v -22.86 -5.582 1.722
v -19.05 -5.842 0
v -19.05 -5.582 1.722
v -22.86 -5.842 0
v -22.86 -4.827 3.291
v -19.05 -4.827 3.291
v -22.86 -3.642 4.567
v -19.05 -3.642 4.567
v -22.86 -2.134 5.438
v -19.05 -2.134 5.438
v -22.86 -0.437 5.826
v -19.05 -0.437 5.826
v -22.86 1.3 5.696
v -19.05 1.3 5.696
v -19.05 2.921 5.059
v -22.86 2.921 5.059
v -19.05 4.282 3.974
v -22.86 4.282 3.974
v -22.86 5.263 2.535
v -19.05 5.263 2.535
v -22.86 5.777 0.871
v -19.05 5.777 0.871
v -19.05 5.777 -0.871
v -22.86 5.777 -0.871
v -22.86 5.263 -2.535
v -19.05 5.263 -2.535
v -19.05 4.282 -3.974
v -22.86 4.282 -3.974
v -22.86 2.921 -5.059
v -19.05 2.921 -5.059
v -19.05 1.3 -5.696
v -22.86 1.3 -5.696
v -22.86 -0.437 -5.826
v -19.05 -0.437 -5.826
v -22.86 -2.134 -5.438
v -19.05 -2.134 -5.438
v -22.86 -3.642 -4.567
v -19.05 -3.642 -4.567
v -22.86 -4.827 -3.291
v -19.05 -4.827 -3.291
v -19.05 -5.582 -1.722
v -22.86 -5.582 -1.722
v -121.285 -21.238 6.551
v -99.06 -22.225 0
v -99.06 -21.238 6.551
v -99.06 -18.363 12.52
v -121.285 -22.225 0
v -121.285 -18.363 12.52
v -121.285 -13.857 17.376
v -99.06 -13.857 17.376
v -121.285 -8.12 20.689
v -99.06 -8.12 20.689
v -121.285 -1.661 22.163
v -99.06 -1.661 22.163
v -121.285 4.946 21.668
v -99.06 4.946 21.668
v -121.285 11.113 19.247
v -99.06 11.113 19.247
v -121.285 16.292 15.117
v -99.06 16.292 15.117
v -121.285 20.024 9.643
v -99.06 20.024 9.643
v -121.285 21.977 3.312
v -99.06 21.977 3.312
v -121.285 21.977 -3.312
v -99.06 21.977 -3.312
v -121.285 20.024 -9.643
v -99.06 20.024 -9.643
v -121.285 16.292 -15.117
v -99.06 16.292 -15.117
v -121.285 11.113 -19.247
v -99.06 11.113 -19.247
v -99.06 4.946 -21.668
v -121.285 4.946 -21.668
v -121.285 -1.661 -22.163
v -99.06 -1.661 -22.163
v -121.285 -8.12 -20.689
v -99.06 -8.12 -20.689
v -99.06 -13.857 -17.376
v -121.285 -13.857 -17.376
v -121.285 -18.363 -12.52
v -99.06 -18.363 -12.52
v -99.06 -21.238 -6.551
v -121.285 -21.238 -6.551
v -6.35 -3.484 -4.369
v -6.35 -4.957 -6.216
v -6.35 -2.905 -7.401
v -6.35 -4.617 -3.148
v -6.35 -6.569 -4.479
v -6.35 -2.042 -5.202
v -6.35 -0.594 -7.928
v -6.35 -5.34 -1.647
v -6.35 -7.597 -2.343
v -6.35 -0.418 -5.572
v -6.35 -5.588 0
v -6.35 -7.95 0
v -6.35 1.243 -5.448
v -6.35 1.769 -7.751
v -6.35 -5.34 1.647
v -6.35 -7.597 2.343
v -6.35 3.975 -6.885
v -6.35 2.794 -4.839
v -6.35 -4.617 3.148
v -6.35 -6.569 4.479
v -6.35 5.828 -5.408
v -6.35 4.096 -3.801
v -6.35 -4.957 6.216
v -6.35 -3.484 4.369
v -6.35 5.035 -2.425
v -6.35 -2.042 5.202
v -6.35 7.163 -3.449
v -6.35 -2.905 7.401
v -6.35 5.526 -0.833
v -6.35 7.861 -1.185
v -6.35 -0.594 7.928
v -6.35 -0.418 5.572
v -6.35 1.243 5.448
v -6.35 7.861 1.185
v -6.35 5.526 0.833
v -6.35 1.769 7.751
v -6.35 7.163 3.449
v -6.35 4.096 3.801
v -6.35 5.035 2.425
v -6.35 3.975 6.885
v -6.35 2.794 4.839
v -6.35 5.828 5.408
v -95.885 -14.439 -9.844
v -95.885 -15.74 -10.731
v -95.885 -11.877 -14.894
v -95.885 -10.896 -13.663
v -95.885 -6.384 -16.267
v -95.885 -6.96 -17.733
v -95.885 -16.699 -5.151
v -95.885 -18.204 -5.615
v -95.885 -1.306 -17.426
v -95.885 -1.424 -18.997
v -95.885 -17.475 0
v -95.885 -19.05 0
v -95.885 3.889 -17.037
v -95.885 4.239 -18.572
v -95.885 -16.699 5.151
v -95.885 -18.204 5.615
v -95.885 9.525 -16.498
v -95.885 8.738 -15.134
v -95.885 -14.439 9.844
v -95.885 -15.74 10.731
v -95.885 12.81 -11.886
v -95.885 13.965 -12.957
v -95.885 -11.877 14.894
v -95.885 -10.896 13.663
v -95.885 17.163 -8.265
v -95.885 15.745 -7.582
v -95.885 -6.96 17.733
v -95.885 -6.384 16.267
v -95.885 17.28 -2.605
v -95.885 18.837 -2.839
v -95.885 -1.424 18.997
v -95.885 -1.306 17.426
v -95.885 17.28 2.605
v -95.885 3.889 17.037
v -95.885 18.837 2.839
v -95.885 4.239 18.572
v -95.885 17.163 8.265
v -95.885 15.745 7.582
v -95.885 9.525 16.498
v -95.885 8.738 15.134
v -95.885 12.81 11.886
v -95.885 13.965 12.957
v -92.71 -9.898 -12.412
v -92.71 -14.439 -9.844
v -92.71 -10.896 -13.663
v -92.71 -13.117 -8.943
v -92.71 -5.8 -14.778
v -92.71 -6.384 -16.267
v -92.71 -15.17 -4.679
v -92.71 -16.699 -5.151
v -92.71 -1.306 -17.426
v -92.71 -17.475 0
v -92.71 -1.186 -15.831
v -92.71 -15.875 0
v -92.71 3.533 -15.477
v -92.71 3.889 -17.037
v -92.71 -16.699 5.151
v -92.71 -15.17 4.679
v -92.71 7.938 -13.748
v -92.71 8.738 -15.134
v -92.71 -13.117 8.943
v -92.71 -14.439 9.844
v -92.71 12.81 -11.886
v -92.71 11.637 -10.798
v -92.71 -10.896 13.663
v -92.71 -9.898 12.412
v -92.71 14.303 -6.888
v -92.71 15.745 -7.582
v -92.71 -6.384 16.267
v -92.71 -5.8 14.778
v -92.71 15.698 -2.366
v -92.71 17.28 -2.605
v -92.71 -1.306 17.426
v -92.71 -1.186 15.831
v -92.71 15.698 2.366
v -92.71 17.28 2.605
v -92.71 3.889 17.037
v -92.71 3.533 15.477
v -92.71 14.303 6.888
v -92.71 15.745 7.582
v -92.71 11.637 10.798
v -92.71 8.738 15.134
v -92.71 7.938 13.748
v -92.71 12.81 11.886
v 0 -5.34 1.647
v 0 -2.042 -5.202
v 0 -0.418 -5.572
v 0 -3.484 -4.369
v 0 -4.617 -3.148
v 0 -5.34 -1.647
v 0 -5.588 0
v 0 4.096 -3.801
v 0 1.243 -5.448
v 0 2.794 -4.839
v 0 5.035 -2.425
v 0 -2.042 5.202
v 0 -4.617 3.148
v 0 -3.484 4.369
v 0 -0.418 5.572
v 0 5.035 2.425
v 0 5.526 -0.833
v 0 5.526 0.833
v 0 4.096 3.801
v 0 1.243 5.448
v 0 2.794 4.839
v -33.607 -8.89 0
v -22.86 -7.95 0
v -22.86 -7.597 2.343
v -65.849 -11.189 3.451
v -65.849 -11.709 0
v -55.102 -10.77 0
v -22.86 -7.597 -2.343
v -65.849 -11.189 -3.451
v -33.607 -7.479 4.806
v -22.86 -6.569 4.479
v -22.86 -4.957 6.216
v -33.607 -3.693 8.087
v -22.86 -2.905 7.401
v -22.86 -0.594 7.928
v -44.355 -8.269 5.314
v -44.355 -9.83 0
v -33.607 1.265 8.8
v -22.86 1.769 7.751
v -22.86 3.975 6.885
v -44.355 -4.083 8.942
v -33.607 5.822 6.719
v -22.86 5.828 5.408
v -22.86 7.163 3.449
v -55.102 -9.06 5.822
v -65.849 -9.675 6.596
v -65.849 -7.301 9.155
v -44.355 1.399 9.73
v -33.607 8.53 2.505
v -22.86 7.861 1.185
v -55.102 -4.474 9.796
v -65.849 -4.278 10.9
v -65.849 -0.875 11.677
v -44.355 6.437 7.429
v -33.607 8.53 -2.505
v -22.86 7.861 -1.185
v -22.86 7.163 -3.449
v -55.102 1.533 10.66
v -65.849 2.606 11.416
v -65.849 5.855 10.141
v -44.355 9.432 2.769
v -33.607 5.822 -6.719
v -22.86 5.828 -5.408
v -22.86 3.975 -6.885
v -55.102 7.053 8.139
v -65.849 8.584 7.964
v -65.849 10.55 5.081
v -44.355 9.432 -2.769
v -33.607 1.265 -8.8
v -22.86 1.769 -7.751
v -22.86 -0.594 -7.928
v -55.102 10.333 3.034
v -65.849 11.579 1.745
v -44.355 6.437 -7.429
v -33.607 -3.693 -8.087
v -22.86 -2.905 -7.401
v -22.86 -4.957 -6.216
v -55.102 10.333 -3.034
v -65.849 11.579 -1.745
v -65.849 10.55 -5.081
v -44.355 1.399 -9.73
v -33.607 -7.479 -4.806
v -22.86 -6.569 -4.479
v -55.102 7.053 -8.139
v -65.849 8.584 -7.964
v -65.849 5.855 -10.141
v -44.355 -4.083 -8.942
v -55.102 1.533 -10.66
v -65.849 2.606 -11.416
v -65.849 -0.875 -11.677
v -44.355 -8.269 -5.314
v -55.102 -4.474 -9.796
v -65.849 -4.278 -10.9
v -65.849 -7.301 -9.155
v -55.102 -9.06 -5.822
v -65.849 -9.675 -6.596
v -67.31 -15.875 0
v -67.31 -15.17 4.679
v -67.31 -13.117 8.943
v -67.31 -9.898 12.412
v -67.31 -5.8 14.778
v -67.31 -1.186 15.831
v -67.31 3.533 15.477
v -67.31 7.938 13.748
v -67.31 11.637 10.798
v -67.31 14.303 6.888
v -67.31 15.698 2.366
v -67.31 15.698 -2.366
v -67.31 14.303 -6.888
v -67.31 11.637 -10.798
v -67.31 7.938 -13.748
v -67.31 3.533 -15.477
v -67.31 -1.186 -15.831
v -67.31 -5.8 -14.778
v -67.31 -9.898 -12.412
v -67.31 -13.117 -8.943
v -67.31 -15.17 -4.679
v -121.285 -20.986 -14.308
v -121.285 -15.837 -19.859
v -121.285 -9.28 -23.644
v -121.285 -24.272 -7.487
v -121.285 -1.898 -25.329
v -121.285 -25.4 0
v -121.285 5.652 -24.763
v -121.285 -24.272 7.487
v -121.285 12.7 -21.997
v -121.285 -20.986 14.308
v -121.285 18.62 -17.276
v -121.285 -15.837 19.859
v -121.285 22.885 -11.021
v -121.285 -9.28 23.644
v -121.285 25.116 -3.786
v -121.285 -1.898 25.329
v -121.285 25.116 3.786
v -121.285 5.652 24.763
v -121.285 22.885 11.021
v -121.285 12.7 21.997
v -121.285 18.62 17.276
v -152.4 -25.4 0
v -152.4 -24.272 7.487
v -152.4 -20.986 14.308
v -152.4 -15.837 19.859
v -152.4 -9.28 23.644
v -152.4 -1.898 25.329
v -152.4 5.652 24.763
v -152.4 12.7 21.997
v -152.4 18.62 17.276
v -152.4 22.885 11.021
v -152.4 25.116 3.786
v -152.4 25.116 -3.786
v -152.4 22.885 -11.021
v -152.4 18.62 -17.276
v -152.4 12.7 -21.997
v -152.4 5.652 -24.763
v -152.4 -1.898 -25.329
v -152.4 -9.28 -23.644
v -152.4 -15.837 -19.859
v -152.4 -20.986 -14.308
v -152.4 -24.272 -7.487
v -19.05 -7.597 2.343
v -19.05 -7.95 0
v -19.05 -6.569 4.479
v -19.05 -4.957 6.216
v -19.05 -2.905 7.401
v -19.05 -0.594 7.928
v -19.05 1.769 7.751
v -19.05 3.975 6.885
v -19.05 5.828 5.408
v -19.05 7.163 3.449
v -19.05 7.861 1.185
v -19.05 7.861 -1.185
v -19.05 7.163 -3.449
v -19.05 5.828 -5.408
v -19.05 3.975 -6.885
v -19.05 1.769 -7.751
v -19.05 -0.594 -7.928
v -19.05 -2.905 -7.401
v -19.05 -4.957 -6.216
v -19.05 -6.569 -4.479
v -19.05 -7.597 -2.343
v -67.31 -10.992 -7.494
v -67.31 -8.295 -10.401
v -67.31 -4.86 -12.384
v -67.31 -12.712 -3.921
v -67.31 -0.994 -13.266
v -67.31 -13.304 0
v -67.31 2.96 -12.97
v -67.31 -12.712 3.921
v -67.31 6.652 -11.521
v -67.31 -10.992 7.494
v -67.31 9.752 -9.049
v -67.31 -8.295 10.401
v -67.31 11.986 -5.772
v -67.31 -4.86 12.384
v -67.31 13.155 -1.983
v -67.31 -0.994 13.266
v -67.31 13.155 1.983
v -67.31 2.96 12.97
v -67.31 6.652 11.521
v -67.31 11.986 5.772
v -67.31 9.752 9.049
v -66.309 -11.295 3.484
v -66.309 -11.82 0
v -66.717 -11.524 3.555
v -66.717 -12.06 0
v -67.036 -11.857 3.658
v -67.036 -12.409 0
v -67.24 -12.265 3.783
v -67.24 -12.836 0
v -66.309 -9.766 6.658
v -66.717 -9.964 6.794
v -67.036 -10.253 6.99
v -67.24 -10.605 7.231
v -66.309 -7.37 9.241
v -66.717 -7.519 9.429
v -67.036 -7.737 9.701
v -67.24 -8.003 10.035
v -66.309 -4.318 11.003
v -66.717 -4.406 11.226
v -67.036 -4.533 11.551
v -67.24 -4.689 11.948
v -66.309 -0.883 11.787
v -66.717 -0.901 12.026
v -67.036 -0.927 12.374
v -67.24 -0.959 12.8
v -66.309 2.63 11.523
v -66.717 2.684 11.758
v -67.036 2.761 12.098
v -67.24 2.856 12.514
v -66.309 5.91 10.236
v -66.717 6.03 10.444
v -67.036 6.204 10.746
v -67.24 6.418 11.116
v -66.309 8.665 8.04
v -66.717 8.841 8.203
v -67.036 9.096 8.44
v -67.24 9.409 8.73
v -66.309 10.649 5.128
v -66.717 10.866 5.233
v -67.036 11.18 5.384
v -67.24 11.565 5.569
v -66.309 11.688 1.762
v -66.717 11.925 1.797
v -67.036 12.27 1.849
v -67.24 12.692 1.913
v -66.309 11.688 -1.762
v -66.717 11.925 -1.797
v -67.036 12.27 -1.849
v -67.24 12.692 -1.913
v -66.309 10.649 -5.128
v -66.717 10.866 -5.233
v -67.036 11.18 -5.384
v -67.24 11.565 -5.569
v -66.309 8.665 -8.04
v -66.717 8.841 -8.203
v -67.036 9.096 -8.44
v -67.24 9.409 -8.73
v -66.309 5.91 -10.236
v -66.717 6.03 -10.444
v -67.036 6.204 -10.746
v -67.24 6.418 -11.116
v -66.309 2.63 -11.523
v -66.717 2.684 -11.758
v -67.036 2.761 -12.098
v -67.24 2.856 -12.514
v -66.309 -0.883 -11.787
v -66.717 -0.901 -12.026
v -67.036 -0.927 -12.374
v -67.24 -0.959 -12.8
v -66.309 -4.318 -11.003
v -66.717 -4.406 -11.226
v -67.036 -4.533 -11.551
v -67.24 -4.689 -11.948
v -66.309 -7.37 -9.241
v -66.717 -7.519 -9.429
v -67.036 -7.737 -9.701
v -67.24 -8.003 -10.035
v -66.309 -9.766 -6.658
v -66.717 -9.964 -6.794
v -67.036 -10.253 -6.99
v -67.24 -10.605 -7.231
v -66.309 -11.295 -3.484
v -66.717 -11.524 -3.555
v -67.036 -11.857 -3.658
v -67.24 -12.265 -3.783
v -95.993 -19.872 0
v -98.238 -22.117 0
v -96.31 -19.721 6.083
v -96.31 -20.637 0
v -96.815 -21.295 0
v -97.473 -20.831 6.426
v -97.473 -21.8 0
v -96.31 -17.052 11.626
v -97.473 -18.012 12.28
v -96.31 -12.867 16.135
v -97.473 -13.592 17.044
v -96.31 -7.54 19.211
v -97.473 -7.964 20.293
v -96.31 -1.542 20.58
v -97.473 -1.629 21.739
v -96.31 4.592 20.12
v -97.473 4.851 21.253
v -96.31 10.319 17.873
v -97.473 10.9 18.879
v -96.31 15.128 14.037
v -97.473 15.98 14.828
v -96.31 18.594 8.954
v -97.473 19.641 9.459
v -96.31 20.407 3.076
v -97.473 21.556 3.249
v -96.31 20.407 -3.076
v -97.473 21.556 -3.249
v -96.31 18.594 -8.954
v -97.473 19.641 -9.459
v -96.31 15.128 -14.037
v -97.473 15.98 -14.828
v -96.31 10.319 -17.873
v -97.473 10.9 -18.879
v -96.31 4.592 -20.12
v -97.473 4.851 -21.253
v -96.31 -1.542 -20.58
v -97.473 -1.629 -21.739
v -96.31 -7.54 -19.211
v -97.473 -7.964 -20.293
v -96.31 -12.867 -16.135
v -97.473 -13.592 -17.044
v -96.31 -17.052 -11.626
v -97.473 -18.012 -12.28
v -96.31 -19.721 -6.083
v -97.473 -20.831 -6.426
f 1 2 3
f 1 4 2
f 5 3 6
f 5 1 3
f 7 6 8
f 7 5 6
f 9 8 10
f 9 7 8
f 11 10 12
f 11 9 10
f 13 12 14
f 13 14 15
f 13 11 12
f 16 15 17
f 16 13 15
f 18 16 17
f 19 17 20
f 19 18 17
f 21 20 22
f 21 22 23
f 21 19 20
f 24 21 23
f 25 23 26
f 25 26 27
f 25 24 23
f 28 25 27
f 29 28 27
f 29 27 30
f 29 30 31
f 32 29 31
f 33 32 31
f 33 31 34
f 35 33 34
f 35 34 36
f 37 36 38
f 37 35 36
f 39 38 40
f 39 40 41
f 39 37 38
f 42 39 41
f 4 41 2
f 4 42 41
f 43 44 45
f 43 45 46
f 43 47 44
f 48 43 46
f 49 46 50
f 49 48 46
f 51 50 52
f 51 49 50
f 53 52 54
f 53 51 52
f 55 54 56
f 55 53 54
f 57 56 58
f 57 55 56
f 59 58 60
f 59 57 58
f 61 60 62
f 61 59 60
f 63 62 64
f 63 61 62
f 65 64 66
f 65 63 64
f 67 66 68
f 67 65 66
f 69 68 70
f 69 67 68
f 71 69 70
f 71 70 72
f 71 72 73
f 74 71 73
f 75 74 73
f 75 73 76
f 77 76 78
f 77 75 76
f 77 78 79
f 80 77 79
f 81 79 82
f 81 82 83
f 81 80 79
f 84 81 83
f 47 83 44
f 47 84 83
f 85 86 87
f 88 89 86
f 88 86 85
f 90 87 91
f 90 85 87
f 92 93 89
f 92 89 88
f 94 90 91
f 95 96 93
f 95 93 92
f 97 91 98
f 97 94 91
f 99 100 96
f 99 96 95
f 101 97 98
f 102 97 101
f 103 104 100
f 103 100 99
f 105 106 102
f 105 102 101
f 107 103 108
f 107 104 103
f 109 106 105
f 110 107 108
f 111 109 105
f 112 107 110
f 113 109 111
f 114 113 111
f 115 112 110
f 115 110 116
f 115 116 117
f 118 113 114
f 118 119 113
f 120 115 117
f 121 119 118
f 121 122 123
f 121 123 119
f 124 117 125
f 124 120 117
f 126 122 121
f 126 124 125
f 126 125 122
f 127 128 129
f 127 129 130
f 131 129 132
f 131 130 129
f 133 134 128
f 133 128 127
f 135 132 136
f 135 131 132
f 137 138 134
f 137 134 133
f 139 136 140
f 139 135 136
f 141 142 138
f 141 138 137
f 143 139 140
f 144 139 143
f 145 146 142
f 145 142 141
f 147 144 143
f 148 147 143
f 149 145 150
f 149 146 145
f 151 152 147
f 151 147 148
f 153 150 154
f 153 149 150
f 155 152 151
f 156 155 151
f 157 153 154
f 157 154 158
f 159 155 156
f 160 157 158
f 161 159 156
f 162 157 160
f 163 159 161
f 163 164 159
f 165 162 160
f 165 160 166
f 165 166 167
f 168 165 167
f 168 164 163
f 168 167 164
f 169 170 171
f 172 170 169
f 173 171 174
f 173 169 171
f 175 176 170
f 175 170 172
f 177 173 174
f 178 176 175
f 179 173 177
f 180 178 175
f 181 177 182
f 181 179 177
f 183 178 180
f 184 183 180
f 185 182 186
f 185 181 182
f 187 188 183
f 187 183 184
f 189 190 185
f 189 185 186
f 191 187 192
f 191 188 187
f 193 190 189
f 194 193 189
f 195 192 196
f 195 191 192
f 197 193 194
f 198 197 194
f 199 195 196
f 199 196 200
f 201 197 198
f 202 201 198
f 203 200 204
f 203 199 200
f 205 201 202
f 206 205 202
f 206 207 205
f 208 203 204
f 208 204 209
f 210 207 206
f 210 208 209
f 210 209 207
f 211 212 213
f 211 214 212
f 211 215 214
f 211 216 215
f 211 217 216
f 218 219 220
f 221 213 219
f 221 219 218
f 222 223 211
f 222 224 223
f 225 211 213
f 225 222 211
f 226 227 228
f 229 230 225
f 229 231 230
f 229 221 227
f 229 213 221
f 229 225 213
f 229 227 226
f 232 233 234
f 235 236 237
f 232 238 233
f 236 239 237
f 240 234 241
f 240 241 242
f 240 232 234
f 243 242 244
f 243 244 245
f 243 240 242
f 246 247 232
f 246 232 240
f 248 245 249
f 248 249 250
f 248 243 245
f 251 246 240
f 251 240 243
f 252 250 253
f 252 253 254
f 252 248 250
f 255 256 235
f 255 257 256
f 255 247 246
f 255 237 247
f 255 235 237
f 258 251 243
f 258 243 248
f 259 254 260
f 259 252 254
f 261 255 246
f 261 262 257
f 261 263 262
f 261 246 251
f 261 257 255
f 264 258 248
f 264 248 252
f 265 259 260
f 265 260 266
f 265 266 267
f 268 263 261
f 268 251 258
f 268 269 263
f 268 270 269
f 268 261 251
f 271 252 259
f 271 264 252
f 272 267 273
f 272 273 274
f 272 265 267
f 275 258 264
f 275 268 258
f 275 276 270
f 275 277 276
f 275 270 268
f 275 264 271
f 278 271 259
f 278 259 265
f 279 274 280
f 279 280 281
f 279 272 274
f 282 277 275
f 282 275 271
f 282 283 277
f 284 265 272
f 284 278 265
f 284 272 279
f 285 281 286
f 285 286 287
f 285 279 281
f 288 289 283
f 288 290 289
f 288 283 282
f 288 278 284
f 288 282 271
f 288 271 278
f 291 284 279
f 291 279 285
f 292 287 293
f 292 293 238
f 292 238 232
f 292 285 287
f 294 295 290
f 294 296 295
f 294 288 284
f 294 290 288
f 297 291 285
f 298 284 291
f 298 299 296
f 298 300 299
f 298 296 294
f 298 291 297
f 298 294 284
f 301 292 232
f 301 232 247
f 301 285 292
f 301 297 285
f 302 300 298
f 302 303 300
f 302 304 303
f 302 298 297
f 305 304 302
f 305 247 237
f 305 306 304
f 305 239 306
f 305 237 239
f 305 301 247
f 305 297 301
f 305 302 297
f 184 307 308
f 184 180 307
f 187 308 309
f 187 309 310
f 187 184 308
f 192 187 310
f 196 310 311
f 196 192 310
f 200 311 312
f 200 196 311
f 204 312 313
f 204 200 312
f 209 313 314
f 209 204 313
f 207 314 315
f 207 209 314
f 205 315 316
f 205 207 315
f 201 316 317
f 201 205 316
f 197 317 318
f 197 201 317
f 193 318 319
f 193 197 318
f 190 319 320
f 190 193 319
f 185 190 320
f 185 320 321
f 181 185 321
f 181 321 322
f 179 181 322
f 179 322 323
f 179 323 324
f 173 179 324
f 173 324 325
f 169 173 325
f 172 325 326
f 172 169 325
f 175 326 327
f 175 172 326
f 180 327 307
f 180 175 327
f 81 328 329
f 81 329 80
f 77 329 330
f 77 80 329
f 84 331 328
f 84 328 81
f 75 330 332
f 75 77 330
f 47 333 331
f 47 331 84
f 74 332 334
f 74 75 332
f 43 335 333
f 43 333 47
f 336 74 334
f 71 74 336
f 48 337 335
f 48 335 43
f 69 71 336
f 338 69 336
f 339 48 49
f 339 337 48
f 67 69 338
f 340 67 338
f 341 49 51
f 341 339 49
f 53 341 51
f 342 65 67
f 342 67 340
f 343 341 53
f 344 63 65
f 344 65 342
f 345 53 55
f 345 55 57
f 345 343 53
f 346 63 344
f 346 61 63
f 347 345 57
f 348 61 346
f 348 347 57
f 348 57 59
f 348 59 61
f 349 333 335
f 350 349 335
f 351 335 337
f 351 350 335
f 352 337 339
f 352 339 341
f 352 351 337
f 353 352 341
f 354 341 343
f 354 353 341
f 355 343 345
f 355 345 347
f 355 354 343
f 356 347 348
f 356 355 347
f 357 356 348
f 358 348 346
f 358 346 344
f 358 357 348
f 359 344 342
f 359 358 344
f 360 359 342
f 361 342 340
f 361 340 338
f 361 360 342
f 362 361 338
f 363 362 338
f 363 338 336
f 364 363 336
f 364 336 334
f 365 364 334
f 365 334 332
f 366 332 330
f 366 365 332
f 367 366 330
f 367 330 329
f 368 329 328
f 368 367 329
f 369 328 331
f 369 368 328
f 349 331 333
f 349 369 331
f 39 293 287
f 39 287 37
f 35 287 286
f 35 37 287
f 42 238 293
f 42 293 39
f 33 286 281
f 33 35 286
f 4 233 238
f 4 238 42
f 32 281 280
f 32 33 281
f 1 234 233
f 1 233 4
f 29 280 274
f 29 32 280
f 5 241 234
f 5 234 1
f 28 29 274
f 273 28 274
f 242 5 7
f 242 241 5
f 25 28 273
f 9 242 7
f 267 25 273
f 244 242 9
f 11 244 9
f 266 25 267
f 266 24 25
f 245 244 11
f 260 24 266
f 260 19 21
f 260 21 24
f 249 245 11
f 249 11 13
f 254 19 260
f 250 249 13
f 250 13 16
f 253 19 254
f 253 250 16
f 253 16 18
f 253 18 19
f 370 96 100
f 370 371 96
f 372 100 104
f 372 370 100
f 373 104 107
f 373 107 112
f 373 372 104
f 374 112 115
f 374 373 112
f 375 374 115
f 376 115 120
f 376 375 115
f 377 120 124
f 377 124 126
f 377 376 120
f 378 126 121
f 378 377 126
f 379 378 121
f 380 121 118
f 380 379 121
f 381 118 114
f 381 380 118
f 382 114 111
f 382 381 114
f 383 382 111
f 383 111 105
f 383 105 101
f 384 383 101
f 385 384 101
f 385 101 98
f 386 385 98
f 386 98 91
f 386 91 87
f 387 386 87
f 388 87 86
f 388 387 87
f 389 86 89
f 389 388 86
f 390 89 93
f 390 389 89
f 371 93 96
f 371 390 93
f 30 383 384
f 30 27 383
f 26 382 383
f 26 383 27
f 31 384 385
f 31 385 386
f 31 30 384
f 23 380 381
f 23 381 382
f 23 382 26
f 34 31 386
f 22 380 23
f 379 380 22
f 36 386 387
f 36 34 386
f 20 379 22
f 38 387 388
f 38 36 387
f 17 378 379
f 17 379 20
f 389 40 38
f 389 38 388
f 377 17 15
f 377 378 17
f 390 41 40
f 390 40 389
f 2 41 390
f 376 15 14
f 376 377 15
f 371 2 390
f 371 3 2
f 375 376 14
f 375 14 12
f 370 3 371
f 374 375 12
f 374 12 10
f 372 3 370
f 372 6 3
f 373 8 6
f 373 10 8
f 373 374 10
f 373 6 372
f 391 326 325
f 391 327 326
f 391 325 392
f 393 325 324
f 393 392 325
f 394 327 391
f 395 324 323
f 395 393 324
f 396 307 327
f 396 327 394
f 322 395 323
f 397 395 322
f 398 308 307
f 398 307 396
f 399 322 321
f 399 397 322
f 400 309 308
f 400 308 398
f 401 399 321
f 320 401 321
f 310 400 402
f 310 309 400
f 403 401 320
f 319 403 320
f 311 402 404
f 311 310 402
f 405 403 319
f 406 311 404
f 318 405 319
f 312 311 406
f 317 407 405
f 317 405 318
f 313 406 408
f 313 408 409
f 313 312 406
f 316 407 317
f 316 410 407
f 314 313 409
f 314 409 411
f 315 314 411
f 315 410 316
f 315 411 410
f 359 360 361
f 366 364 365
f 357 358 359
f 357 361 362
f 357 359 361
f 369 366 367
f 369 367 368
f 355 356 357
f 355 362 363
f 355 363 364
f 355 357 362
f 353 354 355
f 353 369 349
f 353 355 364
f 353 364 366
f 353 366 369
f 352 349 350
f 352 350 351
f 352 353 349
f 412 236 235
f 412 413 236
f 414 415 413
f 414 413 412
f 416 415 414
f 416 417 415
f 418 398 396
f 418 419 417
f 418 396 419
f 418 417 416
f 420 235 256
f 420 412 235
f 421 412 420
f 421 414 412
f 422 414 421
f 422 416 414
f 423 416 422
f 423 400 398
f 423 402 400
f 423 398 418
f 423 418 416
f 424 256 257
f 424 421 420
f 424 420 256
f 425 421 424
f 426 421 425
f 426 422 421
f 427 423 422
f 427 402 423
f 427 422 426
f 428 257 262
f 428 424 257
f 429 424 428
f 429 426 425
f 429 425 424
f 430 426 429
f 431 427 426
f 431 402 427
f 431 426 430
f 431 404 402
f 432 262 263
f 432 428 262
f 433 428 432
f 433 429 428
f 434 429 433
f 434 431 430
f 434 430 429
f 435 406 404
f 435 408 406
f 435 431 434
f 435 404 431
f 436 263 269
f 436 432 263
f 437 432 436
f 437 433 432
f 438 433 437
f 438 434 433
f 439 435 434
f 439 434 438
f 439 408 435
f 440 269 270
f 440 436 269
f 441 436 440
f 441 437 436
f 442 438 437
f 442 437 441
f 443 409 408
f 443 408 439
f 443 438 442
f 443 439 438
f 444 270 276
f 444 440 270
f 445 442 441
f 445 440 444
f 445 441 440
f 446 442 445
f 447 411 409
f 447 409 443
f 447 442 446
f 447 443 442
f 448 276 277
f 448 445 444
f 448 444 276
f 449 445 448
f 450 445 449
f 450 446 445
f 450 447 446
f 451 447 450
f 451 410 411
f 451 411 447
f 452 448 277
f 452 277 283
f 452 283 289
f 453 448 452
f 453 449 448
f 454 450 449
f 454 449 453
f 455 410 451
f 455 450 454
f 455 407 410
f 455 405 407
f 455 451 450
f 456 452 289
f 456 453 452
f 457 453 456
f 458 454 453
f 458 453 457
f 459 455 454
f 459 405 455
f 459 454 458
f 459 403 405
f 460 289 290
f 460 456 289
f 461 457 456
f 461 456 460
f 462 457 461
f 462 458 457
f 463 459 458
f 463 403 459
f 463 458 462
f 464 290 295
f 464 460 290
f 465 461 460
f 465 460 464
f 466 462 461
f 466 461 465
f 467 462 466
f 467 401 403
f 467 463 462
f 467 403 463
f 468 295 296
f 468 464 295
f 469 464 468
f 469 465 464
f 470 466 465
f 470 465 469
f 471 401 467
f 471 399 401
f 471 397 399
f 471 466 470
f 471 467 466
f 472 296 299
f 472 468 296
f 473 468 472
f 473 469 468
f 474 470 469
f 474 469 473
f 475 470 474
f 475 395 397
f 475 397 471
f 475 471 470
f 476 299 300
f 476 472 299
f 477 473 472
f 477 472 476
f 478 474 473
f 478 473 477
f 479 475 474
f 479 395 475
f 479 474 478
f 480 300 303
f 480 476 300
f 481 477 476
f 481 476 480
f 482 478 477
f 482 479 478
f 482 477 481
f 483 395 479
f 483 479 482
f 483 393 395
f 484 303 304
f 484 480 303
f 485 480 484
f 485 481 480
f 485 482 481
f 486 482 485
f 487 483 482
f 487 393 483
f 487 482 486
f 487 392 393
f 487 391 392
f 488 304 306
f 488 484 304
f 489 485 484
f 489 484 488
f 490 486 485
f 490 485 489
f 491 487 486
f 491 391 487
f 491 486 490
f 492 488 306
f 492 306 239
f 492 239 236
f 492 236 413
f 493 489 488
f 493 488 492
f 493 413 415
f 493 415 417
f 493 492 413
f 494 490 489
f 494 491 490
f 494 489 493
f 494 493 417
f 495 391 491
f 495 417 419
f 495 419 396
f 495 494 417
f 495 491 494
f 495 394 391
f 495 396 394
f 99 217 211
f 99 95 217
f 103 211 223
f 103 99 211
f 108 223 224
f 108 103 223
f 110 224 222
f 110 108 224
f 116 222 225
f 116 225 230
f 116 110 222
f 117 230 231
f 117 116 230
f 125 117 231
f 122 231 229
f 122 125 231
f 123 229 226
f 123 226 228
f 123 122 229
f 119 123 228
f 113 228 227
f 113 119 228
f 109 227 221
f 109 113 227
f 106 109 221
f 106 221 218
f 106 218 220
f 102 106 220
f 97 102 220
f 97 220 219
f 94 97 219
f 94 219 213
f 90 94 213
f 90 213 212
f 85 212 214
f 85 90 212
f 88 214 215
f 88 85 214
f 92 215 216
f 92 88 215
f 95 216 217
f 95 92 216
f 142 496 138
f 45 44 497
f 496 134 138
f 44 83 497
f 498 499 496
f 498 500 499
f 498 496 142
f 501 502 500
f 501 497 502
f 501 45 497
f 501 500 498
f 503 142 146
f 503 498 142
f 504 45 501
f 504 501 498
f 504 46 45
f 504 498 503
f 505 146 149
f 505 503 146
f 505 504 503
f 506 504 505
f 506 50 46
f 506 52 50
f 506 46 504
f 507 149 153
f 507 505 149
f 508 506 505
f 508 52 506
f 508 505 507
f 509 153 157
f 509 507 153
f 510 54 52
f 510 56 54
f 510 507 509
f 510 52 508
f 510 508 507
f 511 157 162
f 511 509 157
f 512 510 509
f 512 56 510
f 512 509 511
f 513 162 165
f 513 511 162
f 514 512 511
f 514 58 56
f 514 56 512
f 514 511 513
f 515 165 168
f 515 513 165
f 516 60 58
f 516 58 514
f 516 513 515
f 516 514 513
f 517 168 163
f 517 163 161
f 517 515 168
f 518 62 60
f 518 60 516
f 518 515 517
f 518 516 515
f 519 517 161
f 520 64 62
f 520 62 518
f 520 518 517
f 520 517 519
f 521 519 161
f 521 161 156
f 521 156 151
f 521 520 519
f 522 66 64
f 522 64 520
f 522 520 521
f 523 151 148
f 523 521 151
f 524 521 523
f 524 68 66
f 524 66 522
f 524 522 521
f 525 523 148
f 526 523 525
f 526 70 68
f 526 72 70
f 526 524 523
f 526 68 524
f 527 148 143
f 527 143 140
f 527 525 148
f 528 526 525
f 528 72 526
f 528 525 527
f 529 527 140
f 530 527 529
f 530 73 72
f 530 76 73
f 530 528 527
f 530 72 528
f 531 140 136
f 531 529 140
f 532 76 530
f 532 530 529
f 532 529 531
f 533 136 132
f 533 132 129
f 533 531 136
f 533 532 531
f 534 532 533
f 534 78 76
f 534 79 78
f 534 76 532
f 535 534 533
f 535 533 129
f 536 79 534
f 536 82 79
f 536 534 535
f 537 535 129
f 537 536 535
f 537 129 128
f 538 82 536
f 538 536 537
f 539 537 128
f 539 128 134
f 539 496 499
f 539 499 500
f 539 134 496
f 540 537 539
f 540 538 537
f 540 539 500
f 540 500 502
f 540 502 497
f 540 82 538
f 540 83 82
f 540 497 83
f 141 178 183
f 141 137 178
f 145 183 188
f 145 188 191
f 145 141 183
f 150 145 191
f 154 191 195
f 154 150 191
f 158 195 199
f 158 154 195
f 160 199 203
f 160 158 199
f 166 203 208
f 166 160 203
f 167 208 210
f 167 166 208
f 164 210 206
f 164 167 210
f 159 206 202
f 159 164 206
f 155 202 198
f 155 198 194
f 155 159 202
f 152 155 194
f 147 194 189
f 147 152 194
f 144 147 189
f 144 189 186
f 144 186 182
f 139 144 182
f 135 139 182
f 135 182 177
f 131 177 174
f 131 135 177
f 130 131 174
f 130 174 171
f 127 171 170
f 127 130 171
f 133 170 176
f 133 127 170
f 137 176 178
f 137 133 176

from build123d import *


with BuildPart() as part:
    # Sketch2 → Revolve1 (revolve)
    with BuildSketch(Plane.XY):
        with BuildLine():
            Line((-152.4, 0), (0, 0))
            Line((0, 0), (0, -5.588))
            Line((0, -5.588), (-6.35, -5.588))
            Line((-6.35, -5.588), (-6.35, -7.9502))
            Line((-6.35, -7.9502), (-19.05, -7.9502))
            Line((-19.05, -7.9502), (-19.05, -5.842))
            Line((-19.05, -5.842), (-22.86, -5.842))
            Line((-22.86, -5.842), (-22.86, -7.9502))
            Line((-22.86, -7.9502), (-65.849197896, -11.7094))
            ThreePointArc((-65.849197896, -11.7094), (-66.889567891, -12.222411886), (-67.31, -13.303516767))
            Line((-67.31, -13.303516767), (-67.31, -15.875))
            Line((-67.31, -15.875), (-92.71, -15.875))
            Line((-92.71, -15.875), (-92.71, -17.4752))
            Line((-92.71, -17.4752), (-95.885, -17.4752))
            Line((-95.885, -17.4752), (-95.885, -19.05))
            ThreePointArc((-95.885, -19.05), (-96.81493597, -21.29506403), (-99.06, -22.225))
            Line((-99.06, -22.225), (-121.285, -22.225))
            Line((-121.285, -22.225), (-121.285, -25.4))
            Line((-121.285, -25.4), (-152.4, -25.4))
            Line((-152.4, -25.4), (-152.4, 0))
        make_face()
    revolve(axis=Axis((88.99, 0, 0), (-1, 0, 0)))


solid = part.part
